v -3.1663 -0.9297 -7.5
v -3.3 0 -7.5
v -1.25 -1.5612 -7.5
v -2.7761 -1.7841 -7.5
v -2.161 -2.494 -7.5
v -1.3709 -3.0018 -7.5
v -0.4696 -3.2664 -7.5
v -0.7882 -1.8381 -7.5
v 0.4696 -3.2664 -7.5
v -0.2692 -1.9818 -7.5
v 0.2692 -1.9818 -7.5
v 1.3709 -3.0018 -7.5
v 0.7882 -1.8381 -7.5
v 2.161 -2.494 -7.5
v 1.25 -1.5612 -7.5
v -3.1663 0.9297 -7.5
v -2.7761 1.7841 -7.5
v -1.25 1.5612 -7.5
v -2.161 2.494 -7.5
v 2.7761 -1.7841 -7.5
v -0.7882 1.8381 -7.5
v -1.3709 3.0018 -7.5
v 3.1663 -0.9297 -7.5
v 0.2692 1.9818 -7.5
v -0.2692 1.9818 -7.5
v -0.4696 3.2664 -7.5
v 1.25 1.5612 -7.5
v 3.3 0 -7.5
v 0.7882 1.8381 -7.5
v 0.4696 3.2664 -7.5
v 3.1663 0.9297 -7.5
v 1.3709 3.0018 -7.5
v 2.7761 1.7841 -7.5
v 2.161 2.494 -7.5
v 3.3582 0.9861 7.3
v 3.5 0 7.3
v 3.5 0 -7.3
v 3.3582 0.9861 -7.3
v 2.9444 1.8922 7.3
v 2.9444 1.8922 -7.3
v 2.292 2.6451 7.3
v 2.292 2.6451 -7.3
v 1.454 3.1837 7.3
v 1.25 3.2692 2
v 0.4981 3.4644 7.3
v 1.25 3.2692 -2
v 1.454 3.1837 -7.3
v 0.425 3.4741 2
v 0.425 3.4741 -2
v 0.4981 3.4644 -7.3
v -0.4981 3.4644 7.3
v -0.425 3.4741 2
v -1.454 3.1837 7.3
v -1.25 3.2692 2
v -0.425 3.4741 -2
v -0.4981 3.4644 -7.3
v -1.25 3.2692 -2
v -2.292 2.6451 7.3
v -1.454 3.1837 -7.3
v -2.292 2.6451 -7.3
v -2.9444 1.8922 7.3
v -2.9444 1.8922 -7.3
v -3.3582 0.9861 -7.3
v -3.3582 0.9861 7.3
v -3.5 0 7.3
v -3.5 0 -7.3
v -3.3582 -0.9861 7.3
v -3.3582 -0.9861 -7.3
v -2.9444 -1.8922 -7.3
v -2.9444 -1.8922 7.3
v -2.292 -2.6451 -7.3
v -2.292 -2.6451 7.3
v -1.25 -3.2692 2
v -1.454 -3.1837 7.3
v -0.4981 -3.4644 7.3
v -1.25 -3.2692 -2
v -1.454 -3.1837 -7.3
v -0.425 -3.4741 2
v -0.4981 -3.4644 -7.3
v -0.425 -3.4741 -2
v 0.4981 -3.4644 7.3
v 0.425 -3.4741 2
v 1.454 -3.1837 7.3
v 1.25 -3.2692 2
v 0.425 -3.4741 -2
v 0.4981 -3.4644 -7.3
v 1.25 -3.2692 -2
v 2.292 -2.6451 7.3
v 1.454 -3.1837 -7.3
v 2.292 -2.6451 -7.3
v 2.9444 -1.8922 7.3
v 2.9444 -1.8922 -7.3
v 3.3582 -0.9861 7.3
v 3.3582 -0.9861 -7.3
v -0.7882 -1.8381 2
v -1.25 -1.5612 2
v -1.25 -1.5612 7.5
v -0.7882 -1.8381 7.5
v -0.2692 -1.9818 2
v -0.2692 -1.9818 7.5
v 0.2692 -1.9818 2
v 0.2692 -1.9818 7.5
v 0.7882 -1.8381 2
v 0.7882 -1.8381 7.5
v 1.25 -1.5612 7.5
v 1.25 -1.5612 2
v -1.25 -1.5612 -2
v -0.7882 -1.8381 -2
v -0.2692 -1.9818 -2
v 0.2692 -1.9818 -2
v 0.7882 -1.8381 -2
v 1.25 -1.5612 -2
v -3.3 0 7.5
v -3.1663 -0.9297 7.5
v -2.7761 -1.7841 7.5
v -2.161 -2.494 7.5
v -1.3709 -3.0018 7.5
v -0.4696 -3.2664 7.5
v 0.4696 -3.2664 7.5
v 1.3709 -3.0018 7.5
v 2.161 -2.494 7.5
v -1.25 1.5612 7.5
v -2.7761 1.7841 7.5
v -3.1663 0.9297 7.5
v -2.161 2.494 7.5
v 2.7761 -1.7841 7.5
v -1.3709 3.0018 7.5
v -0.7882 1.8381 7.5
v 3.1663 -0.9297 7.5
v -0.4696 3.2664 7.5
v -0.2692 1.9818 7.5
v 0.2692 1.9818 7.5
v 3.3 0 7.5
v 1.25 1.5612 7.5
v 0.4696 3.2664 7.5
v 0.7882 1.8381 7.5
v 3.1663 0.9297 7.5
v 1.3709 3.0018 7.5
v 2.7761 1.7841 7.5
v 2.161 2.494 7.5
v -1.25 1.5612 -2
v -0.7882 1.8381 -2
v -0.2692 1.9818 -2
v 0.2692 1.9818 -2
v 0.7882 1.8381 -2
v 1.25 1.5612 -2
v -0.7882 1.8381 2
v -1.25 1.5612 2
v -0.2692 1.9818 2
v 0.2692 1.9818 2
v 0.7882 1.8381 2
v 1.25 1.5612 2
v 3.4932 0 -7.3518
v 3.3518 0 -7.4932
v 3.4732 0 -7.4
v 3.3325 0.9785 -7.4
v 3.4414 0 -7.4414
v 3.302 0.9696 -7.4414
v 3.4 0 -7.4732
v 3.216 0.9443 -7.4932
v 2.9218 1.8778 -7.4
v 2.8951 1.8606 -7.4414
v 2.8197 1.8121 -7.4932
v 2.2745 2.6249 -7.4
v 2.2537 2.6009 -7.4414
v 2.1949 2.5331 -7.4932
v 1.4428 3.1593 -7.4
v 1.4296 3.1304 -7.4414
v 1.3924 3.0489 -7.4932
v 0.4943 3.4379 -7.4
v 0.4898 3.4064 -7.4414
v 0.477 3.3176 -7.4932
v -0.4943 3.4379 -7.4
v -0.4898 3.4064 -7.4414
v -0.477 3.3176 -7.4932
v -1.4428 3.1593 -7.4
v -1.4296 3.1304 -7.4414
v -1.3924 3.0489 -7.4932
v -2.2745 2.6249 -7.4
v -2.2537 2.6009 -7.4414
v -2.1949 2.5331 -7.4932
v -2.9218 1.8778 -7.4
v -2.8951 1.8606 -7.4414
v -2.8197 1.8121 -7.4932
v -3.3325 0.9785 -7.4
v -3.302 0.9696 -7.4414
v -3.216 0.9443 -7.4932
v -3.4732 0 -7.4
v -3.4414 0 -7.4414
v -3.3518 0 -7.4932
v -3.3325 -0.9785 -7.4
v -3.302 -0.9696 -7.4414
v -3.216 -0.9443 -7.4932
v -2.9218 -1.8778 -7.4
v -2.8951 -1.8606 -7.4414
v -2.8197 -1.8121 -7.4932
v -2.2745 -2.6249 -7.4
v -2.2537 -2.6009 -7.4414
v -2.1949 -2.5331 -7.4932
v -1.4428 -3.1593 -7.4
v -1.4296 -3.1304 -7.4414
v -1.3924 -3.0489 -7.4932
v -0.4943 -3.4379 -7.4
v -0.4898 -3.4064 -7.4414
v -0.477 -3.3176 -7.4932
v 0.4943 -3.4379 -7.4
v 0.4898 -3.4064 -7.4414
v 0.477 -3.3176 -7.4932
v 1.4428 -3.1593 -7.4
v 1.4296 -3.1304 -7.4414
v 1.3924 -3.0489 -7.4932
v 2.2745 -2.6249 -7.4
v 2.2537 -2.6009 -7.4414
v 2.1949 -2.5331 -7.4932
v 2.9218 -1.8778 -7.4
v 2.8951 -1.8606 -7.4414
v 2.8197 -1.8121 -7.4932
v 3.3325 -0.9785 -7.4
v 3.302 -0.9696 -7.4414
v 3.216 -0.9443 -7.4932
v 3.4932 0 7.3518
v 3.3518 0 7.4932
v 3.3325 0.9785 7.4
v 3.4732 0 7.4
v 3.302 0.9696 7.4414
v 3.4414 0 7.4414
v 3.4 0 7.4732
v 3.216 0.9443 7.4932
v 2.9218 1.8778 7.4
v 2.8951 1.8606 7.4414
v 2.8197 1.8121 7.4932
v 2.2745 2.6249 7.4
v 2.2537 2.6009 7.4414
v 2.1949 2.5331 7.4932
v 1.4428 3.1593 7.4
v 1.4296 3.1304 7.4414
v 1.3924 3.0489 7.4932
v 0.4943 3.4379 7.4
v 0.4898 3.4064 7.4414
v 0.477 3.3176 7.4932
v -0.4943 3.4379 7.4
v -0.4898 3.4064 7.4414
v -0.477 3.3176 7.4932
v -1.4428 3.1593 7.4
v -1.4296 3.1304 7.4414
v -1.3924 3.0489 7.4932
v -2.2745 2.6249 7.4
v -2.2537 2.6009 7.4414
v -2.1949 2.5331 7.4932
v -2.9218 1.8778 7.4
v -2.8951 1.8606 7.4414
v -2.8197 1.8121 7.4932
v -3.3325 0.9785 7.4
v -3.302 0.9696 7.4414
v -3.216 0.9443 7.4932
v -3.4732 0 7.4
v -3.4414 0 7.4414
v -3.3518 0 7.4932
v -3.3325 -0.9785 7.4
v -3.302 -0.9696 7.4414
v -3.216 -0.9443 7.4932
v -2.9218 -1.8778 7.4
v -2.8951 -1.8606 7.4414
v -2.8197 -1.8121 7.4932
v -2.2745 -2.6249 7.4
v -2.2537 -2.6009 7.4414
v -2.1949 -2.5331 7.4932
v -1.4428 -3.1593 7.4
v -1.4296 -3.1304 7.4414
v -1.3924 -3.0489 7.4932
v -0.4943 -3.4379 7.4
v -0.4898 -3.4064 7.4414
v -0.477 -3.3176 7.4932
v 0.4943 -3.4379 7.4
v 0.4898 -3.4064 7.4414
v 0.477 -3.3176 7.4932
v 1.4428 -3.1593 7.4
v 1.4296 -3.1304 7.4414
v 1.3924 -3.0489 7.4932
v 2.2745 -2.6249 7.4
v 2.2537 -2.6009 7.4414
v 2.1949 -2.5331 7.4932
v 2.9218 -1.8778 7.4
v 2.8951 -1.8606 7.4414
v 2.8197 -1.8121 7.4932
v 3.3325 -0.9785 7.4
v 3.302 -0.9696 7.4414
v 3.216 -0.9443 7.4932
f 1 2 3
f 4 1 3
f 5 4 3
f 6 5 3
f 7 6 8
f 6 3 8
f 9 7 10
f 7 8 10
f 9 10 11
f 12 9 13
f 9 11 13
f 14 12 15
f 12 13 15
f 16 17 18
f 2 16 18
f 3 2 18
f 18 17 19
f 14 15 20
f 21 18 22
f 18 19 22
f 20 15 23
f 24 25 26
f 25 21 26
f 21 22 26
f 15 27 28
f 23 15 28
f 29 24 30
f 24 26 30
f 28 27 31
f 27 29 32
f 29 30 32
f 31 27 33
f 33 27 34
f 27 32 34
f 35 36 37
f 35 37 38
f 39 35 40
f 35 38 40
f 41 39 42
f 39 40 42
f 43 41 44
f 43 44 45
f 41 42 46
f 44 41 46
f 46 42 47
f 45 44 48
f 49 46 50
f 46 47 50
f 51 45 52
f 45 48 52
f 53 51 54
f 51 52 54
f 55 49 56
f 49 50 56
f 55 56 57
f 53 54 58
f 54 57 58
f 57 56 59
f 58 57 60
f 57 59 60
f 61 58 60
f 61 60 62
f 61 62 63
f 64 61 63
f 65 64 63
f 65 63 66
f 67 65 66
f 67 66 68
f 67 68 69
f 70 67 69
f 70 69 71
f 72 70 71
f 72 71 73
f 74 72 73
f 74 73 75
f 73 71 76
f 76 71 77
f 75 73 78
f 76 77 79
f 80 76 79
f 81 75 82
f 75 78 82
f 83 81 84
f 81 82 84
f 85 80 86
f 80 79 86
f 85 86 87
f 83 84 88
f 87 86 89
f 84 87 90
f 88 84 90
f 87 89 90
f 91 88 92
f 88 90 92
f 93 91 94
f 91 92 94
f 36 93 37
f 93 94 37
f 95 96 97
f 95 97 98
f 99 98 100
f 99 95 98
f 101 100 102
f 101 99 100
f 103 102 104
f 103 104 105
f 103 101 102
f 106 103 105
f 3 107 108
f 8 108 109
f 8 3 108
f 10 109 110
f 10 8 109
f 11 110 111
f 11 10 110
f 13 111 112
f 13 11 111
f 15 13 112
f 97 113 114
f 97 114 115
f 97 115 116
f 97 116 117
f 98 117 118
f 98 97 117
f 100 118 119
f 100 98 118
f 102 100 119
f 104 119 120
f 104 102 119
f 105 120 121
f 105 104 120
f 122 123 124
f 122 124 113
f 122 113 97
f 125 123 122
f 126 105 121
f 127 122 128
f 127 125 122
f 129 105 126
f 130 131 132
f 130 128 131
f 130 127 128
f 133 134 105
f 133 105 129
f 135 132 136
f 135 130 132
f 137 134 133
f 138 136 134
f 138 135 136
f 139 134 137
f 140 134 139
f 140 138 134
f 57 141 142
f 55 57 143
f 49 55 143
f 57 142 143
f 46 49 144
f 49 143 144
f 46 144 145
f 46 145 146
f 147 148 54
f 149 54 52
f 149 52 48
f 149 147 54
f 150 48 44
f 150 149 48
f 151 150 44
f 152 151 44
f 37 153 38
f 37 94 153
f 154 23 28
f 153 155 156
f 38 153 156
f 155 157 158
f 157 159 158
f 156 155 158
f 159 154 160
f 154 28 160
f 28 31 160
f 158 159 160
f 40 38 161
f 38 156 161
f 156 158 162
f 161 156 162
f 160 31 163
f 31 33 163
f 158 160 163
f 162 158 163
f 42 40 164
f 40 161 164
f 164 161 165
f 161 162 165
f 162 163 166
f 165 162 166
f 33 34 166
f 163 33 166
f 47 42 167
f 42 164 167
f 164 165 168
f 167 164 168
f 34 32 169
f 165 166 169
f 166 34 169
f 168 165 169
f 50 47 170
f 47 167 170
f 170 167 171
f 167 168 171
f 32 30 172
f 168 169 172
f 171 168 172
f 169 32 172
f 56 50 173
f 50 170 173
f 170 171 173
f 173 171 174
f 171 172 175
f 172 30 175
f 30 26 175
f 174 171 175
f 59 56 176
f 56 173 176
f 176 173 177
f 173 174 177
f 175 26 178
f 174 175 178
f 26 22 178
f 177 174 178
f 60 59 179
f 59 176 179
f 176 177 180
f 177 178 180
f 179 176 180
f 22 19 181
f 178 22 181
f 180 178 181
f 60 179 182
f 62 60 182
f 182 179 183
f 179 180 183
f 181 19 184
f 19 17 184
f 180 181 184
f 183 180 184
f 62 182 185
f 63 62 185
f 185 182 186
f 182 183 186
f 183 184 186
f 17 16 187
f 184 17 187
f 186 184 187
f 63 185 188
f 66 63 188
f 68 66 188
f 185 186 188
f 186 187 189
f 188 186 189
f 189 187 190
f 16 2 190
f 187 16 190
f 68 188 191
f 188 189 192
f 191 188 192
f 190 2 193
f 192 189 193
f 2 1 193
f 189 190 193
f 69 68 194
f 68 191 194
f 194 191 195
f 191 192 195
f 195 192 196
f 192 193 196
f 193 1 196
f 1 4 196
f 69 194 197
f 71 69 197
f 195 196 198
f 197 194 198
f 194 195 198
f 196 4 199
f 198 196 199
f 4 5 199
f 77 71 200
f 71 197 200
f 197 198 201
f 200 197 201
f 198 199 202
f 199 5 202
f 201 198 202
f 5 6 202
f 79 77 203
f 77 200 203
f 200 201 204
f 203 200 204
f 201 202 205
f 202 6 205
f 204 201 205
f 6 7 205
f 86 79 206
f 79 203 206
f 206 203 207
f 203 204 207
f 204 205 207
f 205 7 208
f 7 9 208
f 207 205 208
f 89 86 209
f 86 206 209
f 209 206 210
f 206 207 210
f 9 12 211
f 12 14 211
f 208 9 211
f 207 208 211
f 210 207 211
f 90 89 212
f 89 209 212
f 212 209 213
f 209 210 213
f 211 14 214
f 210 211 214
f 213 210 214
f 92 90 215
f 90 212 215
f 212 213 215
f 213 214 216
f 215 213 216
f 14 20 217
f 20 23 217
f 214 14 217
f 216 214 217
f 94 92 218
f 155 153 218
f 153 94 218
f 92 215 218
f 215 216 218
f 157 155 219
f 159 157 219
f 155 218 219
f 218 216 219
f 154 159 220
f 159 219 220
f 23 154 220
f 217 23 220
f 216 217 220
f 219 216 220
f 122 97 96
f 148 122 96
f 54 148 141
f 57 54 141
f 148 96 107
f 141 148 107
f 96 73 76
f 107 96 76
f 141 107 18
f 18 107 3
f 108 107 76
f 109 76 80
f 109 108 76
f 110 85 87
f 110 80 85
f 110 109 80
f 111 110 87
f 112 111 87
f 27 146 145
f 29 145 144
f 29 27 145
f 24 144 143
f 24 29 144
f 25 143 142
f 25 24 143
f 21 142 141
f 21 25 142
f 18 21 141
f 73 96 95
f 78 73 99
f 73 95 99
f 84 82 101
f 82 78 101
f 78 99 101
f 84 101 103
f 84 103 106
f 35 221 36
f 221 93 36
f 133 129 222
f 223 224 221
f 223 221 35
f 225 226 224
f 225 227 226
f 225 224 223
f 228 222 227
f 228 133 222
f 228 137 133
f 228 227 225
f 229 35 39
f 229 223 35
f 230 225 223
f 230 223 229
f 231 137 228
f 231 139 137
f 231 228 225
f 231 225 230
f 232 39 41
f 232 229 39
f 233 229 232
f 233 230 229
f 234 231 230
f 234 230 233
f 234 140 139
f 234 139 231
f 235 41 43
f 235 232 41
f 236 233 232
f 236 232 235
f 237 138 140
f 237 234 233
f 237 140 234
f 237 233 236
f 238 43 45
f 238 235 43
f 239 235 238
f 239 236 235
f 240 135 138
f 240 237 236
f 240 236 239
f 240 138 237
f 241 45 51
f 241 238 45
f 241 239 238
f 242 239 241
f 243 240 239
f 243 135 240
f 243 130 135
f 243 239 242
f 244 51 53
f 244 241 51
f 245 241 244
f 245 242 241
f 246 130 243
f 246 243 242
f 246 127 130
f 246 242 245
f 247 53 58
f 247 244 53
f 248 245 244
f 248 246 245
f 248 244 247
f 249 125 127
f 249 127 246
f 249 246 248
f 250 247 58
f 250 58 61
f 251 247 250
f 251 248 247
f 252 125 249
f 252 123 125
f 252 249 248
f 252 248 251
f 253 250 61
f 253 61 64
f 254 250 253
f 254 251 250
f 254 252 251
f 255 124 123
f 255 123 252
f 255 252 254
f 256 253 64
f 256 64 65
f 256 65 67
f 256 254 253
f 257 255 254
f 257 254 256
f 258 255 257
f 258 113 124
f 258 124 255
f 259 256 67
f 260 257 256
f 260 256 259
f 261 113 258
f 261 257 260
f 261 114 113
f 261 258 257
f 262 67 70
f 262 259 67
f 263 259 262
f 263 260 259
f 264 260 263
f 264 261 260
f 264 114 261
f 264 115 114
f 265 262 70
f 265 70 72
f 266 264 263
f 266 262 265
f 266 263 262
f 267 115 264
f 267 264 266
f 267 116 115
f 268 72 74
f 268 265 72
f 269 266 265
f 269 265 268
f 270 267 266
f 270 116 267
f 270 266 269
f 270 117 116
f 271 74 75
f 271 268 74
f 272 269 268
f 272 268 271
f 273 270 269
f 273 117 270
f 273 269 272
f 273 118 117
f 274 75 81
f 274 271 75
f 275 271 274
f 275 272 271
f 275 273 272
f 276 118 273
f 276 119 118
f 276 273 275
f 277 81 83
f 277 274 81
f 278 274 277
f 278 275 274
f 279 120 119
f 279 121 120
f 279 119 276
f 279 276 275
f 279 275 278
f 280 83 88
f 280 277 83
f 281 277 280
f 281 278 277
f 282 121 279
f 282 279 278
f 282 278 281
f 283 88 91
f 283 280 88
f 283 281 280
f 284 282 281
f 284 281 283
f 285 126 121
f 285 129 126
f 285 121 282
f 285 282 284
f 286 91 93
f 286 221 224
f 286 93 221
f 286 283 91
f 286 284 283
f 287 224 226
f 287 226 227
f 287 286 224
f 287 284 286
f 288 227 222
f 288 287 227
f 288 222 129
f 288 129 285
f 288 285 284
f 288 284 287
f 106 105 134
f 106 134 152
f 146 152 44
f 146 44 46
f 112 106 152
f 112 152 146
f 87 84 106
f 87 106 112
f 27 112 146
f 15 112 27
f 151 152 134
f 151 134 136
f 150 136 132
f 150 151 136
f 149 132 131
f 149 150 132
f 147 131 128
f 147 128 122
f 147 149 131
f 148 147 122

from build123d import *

# Parameters (mm, degrees)
EXTRUDE_1_DEPTH                 = 7.5
EXTRUDE_1_DEPTH_BACK            = 7.5
SKETCH_1_R                      = 3.5
CUT_EXTRUDE_1_REACH             = 10.986
SKETCH_2_W                      = 2.5
SKETCH_2_H                      = 4
CUT_EXTRUDE_1_DIRECTION_2_REACH = 10.986
FILLET_1_R                      = 0.2


with BuildPart() as part:
    # 草图1 → 凸台-拉伸1 (new, two sides: drawn at the far end of the back side and taken through both)
    with BuildSketch(Plane.XY.offset(-EXTRUDE_1_DEPTH_BACK)):
        Circle(SKETCH_1_R)
        with BuildLine():
            Line((-1.25, 1.5612495), (-1.25, -1.5612495))
            ThreePointArc((-1.25, -1.5612495), (0, -2), (1.25, -1.5612495))
            Line((1.25, -1.5612495), (1.25, 1.5612495))
            ThreePointArc((1.25, 1.5612495), (0, 2), (-1.25, 1.5612495))
        make_face(mode=Mode.SUBTRACT)
    extrude(amount=EXTRUDE_1_DEPTH + EXTRUDE_1_DEPTH_BACK)

    # 草图2 → 切除-拉伸1 (cut, up to next)
    with BuildSketch(Plane(origin=(0, 0, 0), x_dir=(1, 0, 0), z_dir=(0, 1, 0)), mode=Mode.PRIVATE) as cut_extrude_1_sk1:
        Rectangle(SKETCH_2_W, SKETCH_2_H)
    cut_extrude_1_tool1 = extrude(cut_extrude_1_sk1.sketch, amount=-CUT_EXTRUDE_1_REACH, mode=Mode.PRIVATE) & part.part
    add(cut_extrude_1_tool1.solids().sort_by_distance((0, 0, 0))[0], mode=Mode.SUBTRACT)

    # 草图2 → 切除-拉伸1 direction 2 (cut, up to next)
    with BuildSketch(Plane(origin=(0, 0, 0), x_dir=(1, 0, 0), z_dir=(0, 1, 0)), mode=Mode.PRIVATE) as cut_extrude_1_direction_2_sk1:
        Rectangle(SKETCH_2_W, SKETCH_2_H)
    cut_extrude_1_direction_2_tool1 = extrude(cut_extrude_1_direction_2_sk1.sketch, amount=CUT_EXTRUDE_1_DIRECTION_2_REACH, mode=Mode.PRIVATE) & part.part
    add(cut_extrude_1_direction_2_tool1.solids().sort_by_distance((0, 0, 0))[0], mode=Mode.SUBTRACT)

    # 圆角1
    fillet_1_edges = [part.edges().sort_by_distance(p)[0] for p in [
        (-3.5, 0, -7.5),
        (-3.5, 0, 7.5),
    ]]
    fillet(fillet_1_edges, radius=FILLET_1_R)


solid = part.part
